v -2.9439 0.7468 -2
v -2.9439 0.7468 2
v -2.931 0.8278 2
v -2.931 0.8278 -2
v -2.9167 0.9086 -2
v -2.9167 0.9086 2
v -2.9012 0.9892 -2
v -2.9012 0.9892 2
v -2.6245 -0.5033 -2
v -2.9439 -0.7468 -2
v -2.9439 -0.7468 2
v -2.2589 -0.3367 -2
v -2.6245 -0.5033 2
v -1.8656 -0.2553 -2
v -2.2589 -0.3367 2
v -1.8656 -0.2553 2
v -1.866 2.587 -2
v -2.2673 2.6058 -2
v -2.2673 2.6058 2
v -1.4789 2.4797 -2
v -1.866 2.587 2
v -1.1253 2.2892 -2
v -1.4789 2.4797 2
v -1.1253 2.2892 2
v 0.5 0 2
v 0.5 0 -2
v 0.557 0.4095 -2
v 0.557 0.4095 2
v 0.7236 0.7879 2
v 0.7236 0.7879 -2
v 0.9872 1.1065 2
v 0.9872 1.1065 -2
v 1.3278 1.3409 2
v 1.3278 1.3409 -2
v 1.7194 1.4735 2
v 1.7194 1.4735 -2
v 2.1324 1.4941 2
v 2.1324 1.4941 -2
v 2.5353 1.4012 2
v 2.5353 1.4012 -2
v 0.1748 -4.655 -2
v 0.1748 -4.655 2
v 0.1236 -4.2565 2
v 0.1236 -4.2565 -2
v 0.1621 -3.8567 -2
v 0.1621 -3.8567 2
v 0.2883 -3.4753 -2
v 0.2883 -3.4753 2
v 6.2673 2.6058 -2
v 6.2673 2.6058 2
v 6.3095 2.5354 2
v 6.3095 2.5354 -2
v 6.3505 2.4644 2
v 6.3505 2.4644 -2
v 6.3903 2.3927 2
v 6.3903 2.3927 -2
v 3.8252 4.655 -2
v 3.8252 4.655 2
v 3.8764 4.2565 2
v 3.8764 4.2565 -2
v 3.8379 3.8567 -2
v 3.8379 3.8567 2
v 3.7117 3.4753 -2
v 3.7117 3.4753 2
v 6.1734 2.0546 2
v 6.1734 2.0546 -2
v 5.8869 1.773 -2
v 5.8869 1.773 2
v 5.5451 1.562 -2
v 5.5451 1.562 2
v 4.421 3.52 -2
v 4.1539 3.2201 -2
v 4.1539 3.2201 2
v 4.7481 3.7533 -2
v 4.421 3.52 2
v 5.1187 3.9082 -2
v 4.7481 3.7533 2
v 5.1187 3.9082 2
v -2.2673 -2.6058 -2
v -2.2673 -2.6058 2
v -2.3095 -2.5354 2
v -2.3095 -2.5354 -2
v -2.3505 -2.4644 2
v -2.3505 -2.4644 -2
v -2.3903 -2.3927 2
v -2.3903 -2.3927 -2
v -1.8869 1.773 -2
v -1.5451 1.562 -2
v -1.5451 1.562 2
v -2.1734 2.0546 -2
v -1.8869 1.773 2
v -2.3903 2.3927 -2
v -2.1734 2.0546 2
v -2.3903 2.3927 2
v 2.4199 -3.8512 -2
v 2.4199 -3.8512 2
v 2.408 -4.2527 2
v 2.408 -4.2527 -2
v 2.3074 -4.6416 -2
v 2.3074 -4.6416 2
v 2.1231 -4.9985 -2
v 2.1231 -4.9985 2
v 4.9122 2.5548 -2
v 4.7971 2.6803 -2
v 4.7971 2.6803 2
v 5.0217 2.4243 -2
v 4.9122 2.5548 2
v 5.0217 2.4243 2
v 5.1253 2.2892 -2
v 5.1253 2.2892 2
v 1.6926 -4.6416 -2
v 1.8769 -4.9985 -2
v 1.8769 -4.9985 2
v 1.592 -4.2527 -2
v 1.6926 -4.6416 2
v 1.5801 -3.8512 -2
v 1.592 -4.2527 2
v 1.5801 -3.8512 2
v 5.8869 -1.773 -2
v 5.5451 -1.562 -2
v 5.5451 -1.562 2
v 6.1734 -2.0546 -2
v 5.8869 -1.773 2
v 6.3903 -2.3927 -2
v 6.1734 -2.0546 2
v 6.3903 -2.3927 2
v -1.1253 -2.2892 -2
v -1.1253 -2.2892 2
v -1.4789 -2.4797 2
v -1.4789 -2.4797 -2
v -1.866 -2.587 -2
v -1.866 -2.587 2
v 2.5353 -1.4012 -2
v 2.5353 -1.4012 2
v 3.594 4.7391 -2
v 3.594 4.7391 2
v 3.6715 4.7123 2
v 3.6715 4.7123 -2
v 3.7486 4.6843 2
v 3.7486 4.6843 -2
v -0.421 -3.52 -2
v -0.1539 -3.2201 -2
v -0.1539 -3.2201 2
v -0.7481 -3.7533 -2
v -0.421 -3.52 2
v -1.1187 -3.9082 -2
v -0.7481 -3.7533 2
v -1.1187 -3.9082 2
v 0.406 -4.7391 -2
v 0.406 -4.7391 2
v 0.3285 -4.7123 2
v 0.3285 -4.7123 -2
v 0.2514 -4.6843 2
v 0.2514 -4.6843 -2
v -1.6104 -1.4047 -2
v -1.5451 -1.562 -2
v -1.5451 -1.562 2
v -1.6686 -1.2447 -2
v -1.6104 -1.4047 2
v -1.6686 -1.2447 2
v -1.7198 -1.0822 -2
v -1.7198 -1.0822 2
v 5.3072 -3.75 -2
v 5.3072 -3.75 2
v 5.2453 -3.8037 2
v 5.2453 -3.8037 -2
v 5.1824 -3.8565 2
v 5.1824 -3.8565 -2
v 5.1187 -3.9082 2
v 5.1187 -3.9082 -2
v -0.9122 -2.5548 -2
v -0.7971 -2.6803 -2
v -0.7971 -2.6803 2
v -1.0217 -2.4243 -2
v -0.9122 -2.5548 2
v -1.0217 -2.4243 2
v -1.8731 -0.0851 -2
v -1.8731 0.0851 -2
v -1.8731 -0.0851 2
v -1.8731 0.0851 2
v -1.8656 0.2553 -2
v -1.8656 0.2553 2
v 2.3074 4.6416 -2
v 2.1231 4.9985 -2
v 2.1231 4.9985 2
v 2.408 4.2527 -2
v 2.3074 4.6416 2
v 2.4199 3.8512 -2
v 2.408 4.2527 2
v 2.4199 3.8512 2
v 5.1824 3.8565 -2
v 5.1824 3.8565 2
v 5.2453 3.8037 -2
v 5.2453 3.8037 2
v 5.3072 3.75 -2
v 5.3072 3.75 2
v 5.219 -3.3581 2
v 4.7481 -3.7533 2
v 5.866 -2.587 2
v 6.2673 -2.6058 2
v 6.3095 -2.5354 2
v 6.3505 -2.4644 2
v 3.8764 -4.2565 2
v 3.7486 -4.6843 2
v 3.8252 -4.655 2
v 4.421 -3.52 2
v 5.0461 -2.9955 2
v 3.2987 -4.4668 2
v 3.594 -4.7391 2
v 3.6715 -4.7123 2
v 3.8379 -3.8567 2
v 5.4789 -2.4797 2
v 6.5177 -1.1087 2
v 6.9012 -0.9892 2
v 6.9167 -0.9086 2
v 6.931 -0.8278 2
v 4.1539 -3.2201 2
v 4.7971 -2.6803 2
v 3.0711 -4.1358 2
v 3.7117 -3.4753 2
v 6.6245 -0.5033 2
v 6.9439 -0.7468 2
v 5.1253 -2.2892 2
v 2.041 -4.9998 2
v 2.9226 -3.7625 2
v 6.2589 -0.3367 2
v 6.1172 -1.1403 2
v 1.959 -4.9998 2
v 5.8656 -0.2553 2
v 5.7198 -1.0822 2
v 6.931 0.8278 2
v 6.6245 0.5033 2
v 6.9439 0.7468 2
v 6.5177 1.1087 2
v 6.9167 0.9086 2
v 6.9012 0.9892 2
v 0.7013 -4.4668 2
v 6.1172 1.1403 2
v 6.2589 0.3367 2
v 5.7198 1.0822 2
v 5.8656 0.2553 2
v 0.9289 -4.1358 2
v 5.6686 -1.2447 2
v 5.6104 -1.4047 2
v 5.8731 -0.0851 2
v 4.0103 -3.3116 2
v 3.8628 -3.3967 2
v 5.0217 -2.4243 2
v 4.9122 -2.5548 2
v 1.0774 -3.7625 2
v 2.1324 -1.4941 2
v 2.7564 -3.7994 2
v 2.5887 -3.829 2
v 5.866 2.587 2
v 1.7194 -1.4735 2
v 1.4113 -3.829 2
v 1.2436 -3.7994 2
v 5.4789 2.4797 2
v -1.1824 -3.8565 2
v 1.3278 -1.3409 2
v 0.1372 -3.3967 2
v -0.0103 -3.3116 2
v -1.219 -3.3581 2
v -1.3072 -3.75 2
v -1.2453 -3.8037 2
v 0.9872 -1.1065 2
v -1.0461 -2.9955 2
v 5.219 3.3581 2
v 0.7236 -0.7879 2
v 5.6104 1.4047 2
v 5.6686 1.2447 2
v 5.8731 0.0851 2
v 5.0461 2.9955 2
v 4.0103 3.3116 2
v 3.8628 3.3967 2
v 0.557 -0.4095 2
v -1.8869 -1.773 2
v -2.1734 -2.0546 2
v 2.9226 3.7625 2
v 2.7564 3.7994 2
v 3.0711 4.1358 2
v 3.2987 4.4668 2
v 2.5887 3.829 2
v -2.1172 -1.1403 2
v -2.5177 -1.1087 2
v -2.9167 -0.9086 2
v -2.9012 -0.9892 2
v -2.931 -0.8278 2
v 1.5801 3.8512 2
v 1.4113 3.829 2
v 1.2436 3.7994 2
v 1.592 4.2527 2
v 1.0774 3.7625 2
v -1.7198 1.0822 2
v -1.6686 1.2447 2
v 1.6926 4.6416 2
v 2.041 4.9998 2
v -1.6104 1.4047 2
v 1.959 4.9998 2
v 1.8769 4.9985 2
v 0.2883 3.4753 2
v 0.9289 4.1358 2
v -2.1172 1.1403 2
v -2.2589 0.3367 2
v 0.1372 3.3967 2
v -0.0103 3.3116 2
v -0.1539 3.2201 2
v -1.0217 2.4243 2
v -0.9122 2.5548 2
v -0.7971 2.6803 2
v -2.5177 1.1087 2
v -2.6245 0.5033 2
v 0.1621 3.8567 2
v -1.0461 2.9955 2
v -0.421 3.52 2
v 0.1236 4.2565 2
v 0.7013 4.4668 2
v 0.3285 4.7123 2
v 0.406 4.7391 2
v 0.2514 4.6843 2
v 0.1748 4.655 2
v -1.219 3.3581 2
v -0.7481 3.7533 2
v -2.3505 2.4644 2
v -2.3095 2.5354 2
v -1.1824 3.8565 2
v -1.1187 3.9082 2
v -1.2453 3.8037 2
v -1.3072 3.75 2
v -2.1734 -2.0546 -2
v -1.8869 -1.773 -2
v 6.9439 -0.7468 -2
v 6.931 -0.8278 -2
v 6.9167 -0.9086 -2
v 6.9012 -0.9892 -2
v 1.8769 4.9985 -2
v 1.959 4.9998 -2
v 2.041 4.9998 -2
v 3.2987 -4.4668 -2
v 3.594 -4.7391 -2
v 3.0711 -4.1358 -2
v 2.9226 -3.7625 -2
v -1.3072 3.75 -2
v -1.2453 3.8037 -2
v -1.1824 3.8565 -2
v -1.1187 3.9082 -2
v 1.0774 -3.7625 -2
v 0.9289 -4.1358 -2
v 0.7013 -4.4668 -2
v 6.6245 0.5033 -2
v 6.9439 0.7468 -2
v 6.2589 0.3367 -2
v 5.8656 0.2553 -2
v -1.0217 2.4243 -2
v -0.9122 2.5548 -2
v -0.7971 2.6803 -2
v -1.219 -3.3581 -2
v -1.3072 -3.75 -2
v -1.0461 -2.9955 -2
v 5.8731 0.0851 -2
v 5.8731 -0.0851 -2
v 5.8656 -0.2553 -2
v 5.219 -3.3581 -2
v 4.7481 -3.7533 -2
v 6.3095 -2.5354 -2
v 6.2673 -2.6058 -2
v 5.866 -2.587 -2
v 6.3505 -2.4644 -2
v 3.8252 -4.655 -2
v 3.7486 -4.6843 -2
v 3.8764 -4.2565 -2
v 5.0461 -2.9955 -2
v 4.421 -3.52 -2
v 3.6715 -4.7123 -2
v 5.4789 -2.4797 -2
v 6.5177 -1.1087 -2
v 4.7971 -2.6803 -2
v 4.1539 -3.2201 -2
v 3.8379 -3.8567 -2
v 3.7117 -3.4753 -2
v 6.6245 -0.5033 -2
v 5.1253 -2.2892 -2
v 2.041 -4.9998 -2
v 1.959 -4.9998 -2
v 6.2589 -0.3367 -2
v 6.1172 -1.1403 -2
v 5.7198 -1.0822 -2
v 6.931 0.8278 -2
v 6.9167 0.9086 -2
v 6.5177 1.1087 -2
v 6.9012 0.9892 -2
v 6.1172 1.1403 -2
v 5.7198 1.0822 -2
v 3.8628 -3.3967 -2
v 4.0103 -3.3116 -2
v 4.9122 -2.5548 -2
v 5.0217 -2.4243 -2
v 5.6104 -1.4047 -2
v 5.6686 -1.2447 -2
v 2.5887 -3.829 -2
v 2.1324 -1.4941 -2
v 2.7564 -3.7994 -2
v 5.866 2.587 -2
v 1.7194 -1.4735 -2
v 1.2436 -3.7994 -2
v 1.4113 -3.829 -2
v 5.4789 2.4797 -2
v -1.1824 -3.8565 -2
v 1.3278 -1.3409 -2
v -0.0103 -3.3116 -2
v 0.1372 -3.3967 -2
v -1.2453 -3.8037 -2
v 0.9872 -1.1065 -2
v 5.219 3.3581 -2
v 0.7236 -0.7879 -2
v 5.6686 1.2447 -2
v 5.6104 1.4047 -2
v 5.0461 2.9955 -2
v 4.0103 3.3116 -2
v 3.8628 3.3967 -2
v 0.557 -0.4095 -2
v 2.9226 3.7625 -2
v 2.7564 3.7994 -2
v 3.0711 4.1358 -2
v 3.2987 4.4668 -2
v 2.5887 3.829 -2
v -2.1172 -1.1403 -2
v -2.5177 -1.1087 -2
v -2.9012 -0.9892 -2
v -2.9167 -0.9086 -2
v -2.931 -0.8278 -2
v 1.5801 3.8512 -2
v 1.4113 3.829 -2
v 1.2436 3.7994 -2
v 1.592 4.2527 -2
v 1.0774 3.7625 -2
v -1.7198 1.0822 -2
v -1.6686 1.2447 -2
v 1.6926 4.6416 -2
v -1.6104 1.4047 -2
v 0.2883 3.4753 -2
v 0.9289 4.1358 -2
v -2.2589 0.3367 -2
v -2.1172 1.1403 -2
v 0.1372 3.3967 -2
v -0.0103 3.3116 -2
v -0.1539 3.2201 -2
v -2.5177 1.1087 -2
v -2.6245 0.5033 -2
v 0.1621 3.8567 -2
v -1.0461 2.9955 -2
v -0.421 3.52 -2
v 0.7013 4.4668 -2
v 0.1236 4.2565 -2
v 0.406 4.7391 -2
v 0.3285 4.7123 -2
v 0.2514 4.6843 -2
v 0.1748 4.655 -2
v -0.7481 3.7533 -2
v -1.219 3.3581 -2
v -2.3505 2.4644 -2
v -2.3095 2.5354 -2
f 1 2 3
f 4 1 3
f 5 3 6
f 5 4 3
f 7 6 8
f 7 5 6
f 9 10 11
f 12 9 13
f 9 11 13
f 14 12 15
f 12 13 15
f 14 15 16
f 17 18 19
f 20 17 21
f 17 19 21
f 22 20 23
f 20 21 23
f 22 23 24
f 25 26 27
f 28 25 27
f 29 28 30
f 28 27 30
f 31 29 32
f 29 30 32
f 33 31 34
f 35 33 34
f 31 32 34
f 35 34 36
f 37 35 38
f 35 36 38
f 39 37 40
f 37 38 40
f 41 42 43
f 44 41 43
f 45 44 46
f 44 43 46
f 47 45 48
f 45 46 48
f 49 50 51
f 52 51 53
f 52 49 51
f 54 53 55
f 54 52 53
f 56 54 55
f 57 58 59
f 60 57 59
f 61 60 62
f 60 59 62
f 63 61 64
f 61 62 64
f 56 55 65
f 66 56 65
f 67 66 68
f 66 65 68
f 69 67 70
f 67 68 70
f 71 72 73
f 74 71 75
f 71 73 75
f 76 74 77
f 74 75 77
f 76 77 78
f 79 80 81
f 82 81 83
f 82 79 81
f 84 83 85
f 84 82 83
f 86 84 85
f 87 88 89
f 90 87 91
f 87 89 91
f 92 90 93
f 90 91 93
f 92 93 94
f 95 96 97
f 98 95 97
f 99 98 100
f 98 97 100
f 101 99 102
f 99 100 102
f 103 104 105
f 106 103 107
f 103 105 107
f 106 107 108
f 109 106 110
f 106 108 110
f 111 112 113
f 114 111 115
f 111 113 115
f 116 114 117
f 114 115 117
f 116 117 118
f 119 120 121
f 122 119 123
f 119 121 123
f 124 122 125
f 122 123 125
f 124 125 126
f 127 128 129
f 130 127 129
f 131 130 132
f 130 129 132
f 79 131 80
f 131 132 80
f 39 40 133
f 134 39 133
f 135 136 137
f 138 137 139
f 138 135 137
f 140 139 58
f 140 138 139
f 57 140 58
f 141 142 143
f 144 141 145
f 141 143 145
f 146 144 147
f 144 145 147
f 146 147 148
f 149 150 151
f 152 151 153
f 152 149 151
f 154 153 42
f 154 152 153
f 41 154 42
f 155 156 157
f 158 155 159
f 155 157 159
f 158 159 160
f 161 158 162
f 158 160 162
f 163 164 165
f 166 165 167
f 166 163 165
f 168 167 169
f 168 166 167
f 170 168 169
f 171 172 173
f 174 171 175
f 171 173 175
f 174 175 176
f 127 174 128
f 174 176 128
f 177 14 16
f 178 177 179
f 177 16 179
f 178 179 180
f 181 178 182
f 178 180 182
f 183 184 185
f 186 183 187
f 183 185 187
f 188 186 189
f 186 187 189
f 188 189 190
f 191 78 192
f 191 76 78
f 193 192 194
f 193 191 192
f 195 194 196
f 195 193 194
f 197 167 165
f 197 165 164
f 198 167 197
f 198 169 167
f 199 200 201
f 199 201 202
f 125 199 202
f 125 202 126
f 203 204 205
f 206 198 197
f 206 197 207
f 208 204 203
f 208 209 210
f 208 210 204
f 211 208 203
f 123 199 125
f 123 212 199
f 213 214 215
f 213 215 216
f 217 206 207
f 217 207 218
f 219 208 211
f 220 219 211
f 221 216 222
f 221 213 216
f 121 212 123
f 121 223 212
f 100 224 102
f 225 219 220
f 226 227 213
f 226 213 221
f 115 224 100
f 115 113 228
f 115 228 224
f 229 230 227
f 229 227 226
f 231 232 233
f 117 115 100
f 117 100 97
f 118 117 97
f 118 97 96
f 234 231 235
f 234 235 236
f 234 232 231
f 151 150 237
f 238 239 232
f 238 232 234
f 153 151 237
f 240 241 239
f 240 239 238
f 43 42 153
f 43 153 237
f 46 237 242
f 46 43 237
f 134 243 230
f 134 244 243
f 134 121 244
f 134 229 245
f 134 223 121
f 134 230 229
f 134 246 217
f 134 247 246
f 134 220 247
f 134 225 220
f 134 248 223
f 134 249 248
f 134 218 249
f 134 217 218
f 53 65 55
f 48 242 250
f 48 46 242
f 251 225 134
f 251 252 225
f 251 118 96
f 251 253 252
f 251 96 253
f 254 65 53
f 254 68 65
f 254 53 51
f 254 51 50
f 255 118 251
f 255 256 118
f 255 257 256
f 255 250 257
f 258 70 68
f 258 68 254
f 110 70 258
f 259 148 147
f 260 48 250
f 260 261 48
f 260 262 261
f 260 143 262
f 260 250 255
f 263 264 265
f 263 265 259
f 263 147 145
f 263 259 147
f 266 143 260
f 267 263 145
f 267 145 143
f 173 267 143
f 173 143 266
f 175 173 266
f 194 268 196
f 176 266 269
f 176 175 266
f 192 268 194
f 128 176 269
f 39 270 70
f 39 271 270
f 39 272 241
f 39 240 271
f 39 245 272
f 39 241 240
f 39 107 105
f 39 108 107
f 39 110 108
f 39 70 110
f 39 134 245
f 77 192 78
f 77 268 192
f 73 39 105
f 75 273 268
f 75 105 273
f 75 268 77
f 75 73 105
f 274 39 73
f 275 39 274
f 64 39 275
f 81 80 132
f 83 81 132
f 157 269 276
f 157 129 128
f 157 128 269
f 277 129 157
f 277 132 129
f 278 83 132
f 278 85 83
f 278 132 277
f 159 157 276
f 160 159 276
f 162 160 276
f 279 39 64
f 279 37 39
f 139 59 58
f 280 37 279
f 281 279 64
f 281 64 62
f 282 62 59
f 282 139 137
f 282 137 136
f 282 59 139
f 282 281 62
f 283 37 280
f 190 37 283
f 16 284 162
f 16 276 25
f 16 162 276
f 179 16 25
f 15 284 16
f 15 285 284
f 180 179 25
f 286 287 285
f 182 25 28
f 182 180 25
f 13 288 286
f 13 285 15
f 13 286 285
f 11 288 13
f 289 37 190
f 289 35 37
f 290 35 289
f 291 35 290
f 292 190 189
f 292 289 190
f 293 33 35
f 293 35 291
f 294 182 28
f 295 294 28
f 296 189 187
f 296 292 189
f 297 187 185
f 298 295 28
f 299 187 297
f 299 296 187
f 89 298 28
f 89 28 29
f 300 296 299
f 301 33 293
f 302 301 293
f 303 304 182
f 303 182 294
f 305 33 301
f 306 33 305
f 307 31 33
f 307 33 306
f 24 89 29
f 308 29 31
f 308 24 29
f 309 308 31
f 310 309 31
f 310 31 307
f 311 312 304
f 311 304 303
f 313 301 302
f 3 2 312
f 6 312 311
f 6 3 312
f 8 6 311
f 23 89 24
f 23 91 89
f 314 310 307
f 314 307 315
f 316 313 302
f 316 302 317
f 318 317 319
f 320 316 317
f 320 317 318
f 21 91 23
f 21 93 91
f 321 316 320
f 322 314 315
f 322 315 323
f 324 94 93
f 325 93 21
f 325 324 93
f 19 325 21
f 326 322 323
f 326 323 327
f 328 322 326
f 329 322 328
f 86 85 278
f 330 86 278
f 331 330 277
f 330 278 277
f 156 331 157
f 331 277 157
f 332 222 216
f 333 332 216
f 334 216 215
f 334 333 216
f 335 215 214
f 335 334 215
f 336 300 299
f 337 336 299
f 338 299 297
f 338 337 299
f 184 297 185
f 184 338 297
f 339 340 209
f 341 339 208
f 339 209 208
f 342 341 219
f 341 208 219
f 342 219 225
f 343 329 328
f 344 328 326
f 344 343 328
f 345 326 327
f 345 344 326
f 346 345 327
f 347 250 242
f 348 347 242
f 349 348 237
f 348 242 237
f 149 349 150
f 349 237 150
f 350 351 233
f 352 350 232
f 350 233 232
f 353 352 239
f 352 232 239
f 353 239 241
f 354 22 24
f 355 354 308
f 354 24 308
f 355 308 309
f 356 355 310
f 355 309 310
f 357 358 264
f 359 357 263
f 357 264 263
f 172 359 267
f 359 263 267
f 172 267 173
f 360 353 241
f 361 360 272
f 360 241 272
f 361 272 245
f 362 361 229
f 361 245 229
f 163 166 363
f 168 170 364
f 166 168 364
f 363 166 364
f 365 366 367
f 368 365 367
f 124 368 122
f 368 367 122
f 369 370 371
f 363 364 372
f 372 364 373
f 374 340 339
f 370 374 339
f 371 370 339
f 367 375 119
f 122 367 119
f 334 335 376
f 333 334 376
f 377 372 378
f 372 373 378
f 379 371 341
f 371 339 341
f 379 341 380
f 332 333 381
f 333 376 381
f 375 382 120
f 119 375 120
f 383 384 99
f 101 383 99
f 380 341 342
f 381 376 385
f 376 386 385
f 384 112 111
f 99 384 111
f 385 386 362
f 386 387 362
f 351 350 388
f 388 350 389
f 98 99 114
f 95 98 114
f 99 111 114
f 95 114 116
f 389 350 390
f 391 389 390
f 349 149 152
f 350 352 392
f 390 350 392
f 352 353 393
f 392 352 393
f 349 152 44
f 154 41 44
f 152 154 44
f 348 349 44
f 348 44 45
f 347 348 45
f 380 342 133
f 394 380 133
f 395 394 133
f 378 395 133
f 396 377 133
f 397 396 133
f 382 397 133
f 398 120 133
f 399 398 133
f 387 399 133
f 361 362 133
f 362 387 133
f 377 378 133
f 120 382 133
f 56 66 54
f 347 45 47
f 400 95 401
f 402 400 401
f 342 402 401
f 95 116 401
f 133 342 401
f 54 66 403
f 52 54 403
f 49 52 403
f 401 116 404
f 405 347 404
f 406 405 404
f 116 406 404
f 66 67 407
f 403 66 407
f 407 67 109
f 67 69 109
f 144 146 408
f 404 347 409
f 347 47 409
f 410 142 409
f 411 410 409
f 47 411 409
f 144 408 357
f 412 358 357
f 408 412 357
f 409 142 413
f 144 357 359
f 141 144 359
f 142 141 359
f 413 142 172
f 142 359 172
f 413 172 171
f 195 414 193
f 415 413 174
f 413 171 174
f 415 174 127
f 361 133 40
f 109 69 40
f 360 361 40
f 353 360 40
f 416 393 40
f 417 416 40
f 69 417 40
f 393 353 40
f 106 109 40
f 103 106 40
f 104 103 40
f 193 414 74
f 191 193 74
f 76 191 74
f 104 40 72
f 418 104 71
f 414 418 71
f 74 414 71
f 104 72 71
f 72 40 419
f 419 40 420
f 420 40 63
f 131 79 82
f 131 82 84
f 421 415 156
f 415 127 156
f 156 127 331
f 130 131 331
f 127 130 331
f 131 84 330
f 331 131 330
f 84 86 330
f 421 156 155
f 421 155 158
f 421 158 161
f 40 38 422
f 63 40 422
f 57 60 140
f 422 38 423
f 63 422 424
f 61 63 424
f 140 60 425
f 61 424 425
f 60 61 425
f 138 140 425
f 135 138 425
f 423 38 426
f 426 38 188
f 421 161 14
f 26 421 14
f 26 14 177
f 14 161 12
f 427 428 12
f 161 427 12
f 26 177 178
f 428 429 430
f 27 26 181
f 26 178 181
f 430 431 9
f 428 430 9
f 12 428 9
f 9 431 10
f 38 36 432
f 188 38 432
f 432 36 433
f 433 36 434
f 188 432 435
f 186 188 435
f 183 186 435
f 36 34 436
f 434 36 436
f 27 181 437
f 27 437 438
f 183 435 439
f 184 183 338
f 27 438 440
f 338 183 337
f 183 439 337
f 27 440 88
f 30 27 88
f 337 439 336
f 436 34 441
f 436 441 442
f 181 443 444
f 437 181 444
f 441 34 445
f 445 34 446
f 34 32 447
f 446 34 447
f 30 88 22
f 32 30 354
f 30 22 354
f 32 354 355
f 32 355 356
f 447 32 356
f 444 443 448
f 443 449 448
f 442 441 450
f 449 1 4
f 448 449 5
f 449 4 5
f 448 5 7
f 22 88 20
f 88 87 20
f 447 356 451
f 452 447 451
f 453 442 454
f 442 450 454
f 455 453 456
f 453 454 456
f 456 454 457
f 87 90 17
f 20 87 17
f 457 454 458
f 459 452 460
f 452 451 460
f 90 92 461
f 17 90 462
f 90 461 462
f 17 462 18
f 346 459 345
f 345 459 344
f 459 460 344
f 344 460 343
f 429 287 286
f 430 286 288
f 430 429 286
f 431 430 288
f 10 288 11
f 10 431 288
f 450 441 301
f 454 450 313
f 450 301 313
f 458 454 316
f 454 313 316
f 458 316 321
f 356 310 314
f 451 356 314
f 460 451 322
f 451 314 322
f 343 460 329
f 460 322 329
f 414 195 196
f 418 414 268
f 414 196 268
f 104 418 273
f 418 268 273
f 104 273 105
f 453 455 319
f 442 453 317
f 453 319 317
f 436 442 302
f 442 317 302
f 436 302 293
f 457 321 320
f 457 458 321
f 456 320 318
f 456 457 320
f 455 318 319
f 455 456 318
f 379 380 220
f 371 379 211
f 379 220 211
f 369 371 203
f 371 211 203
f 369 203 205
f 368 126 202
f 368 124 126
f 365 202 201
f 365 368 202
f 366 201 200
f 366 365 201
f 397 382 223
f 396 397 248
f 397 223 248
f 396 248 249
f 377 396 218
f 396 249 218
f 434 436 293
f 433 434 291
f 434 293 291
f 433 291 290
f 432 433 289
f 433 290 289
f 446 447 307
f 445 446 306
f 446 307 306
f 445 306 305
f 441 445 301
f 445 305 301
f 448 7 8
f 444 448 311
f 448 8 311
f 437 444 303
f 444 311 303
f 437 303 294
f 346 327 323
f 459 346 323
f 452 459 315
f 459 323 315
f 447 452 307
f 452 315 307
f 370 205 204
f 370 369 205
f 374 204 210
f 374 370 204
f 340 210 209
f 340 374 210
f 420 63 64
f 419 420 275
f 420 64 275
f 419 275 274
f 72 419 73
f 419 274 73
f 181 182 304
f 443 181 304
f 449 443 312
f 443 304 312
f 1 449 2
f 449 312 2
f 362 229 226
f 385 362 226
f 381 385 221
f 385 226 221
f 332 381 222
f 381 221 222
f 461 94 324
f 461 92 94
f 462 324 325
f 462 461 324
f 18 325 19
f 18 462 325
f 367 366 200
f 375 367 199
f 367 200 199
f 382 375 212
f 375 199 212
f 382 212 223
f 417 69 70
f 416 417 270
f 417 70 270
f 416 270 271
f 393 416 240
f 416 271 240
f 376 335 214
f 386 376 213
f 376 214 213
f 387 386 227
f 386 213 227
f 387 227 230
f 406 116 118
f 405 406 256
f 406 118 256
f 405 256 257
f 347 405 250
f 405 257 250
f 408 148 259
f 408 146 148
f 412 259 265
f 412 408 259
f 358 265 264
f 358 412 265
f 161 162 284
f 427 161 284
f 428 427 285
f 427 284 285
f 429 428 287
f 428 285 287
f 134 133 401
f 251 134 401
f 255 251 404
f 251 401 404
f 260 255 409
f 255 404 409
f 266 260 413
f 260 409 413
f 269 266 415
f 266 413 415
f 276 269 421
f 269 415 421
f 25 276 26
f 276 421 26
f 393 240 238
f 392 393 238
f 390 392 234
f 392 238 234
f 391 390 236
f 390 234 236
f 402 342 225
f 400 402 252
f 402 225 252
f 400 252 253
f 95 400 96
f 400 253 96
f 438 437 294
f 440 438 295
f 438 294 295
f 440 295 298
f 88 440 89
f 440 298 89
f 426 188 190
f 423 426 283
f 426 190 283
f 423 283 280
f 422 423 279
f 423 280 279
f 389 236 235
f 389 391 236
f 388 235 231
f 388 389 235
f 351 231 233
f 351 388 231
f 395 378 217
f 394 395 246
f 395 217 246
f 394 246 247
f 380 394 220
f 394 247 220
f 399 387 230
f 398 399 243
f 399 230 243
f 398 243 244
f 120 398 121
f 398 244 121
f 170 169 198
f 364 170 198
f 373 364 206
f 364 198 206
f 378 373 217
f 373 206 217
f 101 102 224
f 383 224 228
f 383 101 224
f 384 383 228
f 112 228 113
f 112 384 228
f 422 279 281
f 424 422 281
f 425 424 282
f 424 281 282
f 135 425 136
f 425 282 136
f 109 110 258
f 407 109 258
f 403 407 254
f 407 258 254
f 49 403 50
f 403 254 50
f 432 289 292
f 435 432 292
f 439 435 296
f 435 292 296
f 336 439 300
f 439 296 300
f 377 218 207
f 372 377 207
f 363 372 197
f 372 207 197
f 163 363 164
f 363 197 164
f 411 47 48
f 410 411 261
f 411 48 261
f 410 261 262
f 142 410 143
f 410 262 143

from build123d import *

# Parameters (mm, degrees)
BASPROSKE_W           = 4
BASPROSKE_H           = 5
TOOTHCUT_DEPTH        = 9.124038405
TEETHCUTS_COUNT       = 18
TEETHCUTS_ANGLE       = 340
BORE_DEPTH            = 50.0000508
BODY_MOVE_COPY1_ANGLE = 90
BODY_MOVE_COPY2_ANGLE = 90


with BuildPart() as part:
    # BasProSke → Base-Revolve (revolve)
    with BuildSketch(Plane(origin=(0, 0, 0), x_dir=(1, 0, 0), z_dir=(0, 1, 0)), mode=Mode.PRIVATE) as base_revolve_sk:
        with Locations((2, 2.5)):
            Rectangle(BASPROSKE_W, BASPROSKE_H)
    revolve(base_revolve_sk.sketch.rotate(Axis((-10, 0, 0), (1, 0, 0)), 180), axis=Axis((-10, 0, 0), (1, 0, 0)))

    # TooCutSke → ToothCut (cut, through all)
    with BuildSketch(Plane(origin=(0, 0, 0), x_dir=(0, 0, -1), z_dir=(1, 0, 0))):
        with BuildLine():
            ThreePointArc((0.25527463, 3.865580275), (0, 3.874), (-0.25527463, 3.865580275))
            ThreePointArc((-0.25527463, 3.865580275), (-0.416281865, 4.46052923), (-0.768562654, 4.96628197))
            ThreePointArc((-0.768562654, 4.96628197), (0, 5.0254), (0.768562654, 4.96628197))
            ThreePointArc((0.768562654, 4.96628197), (0.416281865, 4.46052923), (0.25527463, 3.865580275))
        make_face()
    toothcut = extrude(amount=TOOTHCUT_DEPTH, mode=Mode.SUBTRACT)

    # TeethCuts: ToothCut ×18 about axis
    teethcuts_axis = Axis((-10, 0, 0), (1, 0, 0))
    for i in range(1, TEETHCUTS_COUNT):
        add(toothcut.rotate(teethcuts_axis, i * TEETHCUTS_ANGLE / (TEETHCUTS_COUNT - 1)), mode=Mode.SUBTRACT)

    # BorSke → Bore (cut, symmetric)
    with BuildSketch(Plane(origin=(0, 0, 0), x_dir=(0, 0, -1), z_dir=(1, 0, 0))):
        with BuildLine():
            ThreePointArc((-1.401240549, 0.535280228), (-1.235499968, -0.850611444), (0, -1.5))
            Line((0, -1.5), (0, 0.535280228))
            Line((0, 0.535280228), (-1.401240549, 0.535280228))
        make_face()
        with BuildLine():
            Line((0, 0.535280228), (0, -1.5))
            ThreePointArc((0, -1.5), (1.060660172, -1.060660172), (1.5, 0))
            ThreePointArc((1.5, 0), (1.475103526, 0.272157285), (1.401240549, 0.535280228))
            Line((1.401240549, 0.535280228), (0, 0.535280228))
        make_face()
    extrude(amount=BORE_DEPTH, both=True, mode=Mode.SUBTRACT)


with BuildPart() as part_1:
    # Body-Move/Copy1: moved
    add(part.part.rotate(Axis((2, 0, 0), (0, 0, -1)), BODY_MOVE_COPY1_ANGLE))


with BuildPart() as part_2:
    # Body-Move/Copy2: moved
    add(part_1.part.rotate(Axis((0, 0, 0), (1, 0, 0)), BODY_MOVE_COPY2_ANGLE))


solid = part_2.part
